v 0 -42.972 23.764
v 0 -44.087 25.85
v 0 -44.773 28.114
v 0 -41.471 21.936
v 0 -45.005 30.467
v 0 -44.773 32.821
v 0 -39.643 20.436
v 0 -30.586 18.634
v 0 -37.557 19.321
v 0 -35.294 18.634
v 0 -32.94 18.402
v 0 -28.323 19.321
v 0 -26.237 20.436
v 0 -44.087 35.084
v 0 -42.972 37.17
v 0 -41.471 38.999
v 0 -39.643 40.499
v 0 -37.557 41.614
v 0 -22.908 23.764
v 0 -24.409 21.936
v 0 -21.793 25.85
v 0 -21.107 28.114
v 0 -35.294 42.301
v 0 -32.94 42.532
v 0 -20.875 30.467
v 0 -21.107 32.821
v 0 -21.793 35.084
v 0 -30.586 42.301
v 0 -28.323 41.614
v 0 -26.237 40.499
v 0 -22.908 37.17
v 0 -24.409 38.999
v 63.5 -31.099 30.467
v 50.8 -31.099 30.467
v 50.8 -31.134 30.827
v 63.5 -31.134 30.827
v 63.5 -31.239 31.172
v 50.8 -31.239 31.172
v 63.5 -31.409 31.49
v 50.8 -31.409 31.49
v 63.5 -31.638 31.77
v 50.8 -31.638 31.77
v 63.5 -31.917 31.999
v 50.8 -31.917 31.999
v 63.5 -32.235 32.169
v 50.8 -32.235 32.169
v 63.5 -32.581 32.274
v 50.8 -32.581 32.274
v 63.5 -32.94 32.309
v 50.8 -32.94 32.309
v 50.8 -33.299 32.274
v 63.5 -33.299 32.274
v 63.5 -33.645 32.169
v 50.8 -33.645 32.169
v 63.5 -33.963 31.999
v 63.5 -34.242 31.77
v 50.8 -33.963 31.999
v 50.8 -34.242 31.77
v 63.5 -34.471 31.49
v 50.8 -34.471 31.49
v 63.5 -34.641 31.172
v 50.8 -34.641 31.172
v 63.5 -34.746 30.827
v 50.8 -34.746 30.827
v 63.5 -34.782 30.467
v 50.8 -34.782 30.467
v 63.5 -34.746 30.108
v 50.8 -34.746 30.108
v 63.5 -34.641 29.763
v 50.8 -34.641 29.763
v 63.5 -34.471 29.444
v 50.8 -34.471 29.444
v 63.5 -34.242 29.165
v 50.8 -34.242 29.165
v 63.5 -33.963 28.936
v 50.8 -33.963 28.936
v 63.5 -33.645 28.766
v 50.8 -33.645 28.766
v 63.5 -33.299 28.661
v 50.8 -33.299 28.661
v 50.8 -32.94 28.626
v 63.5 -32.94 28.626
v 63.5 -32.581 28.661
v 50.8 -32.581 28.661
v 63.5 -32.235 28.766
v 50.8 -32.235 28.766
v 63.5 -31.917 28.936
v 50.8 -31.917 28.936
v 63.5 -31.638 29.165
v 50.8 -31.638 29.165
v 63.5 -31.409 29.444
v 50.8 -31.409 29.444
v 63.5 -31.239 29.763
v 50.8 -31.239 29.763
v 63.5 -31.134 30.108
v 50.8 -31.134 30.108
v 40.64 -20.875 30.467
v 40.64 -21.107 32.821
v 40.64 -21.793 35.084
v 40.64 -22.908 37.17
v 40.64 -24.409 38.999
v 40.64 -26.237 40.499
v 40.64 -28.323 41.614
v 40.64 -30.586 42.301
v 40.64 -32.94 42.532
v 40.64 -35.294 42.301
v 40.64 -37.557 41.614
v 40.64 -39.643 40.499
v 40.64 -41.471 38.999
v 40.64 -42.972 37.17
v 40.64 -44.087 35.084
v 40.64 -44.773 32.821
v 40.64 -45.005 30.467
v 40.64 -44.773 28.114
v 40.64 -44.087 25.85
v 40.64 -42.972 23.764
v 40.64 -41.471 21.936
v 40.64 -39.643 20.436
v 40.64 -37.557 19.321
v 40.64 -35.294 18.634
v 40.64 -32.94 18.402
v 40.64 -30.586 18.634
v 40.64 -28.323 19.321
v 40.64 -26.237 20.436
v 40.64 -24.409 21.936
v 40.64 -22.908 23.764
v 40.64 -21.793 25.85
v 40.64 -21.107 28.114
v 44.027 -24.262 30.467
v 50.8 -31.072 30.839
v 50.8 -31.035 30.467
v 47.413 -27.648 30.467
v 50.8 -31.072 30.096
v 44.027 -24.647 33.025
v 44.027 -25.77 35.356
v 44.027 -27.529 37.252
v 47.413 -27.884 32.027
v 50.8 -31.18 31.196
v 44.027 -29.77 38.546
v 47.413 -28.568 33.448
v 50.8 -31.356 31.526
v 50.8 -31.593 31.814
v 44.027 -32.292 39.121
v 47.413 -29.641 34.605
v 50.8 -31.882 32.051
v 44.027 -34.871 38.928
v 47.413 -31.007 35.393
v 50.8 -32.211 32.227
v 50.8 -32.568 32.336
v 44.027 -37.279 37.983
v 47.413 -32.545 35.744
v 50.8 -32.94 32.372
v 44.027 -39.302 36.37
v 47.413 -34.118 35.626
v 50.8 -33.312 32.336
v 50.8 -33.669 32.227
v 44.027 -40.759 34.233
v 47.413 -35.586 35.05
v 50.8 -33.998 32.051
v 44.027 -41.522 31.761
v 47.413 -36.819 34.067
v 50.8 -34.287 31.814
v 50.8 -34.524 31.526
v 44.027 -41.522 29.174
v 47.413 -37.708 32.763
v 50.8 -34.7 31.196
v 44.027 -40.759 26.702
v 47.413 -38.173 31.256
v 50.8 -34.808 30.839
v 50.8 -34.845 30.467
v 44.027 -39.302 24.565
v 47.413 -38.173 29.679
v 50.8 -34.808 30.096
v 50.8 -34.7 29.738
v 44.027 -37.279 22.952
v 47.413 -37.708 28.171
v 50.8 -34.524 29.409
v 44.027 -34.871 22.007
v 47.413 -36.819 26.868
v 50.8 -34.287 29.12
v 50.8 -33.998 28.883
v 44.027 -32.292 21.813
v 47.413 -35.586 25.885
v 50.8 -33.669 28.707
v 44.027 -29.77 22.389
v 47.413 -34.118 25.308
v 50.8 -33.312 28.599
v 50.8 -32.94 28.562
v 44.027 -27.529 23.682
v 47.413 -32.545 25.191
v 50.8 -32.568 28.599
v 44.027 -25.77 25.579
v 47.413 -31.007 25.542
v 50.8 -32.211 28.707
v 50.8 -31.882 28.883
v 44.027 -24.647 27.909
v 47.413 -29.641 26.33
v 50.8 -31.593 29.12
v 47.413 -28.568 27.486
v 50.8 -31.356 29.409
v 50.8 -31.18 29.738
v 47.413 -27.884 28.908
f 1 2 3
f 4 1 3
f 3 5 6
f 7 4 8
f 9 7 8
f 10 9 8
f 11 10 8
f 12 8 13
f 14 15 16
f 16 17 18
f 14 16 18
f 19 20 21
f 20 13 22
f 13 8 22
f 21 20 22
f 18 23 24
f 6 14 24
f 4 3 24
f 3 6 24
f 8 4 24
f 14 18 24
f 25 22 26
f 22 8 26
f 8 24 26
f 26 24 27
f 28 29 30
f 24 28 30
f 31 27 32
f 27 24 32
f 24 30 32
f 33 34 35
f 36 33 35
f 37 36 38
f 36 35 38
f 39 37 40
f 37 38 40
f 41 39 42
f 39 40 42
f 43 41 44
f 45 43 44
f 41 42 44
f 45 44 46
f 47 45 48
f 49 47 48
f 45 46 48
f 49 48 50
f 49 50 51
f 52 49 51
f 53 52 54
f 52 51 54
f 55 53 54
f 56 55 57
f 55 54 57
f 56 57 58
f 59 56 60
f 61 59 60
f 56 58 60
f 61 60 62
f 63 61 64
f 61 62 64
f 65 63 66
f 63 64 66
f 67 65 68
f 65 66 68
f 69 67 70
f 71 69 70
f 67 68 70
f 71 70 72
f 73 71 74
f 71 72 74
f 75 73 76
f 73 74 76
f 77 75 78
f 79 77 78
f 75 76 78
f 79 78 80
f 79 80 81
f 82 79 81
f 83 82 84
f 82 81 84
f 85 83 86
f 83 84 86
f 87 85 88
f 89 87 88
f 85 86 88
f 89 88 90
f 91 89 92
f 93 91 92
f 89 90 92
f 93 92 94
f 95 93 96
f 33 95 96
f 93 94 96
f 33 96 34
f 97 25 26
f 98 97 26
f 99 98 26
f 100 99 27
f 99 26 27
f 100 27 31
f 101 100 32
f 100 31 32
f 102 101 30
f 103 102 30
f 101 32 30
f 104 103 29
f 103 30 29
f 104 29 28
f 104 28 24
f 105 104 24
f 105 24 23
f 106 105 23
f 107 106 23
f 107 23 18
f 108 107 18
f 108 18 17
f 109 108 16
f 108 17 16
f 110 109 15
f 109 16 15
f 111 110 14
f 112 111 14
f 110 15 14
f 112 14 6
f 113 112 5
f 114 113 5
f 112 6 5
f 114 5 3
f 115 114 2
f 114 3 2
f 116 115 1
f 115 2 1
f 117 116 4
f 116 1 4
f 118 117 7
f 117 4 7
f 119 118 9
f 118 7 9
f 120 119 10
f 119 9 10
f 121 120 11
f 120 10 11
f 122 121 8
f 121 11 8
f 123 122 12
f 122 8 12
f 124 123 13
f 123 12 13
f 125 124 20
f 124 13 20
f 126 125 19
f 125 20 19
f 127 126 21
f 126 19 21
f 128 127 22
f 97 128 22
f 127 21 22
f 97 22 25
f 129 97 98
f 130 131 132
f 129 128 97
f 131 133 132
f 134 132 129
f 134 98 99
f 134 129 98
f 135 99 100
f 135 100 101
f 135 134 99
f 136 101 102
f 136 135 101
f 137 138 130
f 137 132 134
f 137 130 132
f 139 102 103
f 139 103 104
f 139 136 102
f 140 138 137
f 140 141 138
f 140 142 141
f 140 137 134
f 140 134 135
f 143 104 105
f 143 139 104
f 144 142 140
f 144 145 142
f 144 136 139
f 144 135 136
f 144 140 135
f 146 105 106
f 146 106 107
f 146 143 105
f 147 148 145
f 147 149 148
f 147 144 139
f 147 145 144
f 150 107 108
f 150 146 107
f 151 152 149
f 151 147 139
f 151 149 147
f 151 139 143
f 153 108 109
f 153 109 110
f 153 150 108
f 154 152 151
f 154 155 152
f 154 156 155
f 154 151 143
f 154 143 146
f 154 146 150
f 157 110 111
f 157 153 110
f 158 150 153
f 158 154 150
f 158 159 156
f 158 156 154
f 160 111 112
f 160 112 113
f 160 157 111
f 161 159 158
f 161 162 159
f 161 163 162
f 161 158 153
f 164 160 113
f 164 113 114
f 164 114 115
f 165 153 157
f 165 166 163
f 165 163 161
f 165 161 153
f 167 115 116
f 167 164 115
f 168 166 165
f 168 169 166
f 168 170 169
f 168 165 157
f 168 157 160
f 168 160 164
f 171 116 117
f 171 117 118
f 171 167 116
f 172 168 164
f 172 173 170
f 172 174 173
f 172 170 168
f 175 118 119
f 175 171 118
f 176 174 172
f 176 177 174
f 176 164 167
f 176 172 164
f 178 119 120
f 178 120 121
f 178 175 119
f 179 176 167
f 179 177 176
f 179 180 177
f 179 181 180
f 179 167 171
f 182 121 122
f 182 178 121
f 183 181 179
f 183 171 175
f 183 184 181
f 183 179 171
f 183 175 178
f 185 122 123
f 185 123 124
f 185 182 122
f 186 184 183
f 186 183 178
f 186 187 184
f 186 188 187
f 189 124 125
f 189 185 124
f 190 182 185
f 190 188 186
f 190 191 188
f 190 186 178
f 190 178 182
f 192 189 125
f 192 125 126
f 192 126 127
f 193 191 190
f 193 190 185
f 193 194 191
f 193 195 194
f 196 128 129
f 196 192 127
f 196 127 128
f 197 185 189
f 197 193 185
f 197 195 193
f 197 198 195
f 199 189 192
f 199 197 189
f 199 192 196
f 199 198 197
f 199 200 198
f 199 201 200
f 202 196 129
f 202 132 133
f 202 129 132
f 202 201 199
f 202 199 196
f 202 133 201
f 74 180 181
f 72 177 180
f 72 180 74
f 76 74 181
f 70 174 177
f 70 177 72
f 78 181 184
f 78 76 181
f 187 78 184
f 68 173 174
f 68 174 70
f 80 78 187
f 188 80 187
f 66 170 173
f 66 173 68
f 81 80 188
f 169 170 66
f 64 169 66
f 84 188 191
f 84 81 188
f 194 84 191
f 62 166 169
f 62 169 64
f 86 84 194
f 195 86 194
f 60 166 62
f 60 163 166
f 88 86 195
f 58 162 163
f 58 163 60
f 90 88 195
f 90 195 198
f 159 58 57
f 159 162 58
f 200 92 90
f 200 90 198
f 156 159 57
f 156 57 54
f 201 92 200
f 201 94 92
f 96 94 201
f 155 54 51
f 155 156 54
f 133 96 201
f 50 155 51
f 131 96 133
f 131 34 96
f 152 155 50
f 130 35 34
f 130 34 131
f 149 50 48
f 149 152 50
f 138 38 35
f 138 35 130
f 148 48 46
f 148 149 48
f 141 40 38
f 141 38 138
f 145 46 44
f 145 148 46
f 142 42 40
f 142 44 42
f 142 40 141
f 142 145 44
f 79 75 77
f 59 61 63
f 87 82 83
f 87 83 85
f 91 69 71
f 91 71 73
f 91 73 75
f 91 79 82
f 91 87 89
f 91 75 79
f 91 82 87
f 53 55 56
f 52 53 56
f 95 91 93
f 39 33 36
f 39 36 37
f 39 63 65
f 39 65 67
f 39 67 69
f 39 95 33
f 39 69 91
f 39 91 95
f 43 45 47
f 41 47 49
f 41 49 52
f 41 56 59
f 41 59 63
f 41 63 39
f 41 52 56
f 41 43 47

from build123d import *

# Parameters (mm, degrees)
F0_R     = 12.065
F1_DEPTH = 50.8
F2_R     = 1.8415
F3_DEPTH = 12.7
F4_SIZE  = 10.16


with BuildPart() as f1:
    # F0 (on Right) → F1 (new body)
    with BuildSketch(Plane.YZ):
        with Locations((-32.940101, 30.467385)):
            Circle(F0_R)
    extrude(amount=F1_DEPTH)

    # F2 (on face) → F3 (join)
    with BuildSketch(Plane.YZ.offset(50.8)):
        with Locations((-32.940101, 30.467385)):
            Circle(F2_R)
    extrude(amount=F3_DEPTH)

    # F4
    f4_edges = [f1.edges().sort_by_distance(p)[0] for p in [
        (50.8, -45.005101, 30.467385),
    ]]
    chamfer(f4_edges, length=F4_SIZE)


solid = f1.part
